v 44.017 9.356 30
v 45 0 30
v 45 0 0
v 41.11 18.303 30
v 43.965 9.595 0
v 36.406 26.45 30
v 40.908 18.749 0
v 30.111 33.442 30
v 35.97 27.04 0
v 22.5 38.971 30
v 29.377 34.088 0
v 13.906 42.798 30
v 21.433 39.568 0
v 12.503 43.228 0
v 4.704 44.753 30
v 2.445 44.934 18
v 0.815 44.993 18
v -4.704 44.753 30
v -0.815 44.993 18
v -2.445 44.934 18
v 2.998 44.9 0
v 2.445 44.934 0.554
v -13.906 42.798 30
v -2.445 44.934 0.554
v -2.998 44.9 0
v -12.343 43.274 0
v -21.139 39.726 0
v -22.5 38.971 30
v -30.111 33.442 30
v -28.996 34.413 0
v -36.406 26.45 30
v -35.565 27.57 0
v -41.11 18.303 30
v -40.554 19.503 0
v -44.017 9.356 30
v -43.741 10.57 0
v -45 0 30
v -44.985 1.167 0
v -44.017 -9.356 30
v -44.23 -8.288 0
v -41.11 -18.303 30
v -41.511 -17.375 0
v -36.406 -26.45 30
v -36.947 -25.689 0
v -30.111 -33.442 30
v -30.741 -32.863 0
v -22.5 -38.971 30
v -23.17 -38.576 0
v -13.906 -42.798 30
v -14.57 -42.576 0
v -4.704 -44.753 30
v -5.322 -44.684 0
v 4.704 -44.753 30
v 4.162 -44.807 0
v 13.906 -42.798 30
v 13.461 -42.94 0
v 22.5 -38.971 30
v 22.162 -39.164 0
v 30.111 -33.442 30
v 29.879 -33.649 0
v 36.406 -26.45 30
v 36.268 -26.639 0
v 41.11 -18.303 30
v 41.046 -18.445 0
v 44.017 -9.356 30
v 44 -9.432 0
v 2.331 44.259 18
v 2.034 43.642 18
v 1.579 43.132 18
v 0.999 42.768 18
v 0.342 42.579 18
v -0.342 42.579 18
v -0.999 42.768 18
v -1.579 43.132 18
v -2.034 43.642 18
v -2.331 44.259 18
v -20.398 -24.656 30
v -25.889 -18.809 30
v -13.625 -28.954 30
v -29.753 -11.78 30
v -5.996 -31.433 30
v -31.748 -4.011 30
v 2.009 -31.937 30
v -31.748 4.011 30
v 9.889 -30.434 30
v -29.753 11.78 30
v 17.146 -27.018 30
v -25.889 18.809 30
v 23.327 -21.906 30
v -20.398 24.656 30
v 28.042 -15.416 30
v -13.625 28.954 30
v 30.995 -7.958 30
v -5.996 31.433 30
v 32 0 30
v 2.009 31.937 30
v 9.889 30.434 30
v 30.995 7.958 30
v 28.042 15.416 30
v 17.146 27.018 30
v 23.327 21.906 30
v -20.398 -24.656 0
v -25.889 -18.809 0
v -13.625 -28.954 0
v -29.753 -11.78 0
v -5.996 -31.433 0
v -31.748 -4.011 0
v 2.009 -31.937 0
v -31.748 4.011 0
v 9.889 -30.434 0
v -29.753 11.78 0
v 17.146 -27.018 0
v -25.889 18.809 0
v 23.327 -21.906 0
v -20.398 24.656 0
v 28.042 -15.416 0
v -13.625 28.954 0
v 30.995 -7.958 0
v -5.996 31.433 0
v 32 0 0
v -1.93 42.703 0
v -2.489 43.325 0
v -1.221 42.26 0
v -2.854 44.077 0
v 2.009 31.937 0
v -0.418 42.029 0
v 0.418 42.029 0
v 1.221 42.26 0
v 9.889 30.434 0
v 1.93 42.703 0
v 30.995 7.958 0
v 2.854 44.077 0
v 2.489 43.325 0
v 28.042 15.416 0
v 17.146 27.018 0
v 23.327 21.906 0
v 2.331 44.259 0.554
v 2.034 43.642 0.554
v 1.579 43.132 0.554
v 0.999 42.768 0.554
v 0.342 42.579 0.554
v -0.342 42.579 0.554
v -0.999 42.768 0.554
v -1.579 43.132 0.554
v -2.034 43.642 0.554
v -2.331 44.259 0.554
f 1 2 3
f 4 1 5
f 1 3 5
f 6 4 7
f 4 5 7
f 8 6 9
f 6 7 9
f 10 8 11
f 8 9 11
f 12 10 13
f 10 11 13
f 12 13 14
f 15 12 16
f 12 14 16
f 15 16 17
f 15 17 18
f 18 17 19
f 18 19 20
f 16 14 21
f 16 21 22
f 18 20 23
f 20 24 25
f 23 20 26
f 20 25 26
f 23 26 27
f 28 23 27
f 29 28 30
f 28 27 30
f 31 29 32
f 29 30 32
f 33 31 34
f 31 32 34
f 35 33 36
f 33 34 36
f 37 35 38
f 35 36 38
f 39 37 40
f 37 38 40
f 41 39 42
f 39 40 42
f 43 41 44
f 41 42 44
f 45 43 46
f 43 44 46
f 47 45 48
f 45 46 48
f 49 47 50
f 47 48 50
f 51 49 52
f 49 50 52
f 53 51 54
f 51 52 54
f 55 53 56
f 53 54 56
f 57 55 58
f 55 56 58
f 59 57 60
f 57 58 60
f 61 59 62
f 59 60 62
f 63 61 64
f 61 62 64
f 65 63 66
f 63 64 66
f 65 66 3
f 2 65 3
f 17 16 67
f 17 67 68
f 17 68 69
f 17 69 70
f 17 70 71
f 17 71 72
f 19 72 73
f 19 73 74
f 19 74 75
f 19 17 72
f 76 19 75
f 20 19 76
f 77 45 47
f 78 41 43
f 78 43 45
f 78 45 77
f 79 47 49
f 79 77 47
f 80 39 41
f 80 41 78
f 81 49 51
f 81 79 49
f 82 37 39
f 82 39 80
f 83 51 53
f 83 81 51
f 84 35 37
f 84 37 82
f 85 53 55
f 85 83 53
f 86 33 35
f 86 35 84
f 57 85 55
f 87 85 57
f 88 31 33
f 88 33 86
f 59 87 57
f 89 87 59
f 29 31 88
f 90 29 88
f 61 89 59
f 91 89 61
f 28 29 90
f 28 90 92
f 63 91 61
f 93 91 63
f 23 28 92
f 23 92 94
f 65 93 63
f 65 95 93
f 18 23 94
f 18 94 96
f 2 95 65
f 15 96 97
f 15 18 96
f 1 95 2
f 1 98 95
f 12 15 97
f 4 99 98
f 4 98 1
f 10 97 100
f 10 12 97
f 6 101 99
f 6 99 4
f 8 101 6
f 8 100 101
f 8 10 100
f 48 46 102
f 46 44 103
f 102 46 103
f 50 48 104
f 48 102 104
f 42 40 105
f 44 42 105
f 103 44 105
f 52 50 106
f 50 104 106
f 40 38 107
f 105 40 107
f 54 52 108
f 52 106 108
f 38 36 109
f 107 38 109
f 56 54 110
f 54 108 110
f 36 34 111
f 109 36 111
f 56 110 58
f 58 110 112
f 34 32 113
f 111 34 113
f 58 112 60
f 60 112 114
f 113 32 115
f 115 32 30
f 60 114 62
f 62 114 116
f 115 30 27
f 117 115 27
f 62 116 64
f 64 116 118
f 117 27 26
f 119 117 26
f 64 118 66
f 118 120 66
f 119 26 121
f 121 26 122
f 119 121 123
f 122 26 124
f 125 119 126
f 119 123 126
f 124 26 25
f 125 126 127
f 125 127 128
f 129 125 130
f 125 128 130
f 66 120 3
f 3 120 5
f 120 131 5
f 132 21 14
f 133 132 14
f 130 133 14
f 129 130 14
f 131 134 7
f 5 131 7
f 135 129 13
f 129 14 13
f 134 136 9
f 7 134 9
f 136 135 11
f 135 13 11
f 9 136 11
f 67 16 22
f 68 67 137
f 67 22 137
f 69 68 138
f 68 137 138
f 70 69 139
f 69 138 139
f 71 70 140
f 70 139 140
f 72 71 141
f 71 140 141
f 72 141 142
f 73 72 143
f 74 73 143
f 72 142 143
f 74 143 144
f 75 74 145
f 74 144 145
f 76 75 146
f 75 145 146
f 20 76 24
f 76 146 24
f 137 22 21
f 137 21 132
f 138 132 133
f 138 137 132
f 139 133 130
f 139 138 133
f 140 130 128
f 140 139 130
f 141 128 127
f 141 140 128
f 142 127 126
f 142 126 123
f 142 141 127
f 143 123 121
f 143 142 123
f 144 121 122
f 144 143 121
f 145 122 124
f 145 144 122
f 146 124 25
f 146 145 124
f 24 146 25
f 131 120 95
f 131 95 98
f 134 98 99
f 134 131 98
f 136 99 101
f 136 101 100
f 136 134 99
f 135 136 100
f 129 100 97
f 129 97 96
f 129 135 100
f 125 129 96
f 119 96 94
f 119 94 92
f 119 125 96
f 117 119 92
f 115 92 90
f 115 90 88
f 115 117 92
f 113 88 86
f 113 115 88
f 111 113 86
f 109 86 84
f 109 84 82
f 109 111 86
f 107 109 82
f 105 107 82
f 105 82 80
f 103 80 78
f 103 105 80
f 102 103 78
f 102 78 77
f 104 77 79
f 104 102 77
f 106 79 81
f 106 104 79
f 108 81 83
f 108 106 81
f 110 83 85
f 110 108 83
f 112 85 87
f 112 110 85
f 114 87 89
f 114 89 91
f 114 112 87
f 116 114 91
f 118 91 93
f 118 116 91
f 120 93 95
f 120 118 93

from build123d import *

# Parameters (mm, degrees)
SKETCH_1_R          = 45
SKETCH_1_R_2        = 32
EXTRUDE_1_DEPTH     = 30
SKETCH_2_R          = 2.4455
CUT_EXTRUDE_1_DEPTH = 18
CHAMFER_1_SIZE      = 0.5545


with BuildPart() as part:
    # Эскиз1 → Бобышка-Вытянуть1 (new body)
    with BuildSketch(Plane.XY):
        Circle(SKETCH_1_R)
        Circle(SKETCH_1_R_2, mode=Mode.SUBTRACT)
    extrude(amount=EXTRUDE_1_DEPTH)

    # Эскиз2 → Вырез-Вытянуть1 (cut)
    with BuildSketch(Plane(origin=(0, 0, 0), x_dir=(-1, 0, 0), z_dir=(0, 0, -1))):
        with Locations((0, 45)):
            Circle(SKETCH_2_R)
    extrude(amount=-CUT_EXTRUDE_1_DEPTH, mode=Mode.SUBTRACT)

    # Фаска1
    chamfer_1_edges = [part.edges().sort_by_distance(p)[0] for p in [
        (0, 42.5545, 0),
    ]]
    chamfer(chamfer_1_edges, length=CHAMFER_1_SIZE)


solid = part.part
